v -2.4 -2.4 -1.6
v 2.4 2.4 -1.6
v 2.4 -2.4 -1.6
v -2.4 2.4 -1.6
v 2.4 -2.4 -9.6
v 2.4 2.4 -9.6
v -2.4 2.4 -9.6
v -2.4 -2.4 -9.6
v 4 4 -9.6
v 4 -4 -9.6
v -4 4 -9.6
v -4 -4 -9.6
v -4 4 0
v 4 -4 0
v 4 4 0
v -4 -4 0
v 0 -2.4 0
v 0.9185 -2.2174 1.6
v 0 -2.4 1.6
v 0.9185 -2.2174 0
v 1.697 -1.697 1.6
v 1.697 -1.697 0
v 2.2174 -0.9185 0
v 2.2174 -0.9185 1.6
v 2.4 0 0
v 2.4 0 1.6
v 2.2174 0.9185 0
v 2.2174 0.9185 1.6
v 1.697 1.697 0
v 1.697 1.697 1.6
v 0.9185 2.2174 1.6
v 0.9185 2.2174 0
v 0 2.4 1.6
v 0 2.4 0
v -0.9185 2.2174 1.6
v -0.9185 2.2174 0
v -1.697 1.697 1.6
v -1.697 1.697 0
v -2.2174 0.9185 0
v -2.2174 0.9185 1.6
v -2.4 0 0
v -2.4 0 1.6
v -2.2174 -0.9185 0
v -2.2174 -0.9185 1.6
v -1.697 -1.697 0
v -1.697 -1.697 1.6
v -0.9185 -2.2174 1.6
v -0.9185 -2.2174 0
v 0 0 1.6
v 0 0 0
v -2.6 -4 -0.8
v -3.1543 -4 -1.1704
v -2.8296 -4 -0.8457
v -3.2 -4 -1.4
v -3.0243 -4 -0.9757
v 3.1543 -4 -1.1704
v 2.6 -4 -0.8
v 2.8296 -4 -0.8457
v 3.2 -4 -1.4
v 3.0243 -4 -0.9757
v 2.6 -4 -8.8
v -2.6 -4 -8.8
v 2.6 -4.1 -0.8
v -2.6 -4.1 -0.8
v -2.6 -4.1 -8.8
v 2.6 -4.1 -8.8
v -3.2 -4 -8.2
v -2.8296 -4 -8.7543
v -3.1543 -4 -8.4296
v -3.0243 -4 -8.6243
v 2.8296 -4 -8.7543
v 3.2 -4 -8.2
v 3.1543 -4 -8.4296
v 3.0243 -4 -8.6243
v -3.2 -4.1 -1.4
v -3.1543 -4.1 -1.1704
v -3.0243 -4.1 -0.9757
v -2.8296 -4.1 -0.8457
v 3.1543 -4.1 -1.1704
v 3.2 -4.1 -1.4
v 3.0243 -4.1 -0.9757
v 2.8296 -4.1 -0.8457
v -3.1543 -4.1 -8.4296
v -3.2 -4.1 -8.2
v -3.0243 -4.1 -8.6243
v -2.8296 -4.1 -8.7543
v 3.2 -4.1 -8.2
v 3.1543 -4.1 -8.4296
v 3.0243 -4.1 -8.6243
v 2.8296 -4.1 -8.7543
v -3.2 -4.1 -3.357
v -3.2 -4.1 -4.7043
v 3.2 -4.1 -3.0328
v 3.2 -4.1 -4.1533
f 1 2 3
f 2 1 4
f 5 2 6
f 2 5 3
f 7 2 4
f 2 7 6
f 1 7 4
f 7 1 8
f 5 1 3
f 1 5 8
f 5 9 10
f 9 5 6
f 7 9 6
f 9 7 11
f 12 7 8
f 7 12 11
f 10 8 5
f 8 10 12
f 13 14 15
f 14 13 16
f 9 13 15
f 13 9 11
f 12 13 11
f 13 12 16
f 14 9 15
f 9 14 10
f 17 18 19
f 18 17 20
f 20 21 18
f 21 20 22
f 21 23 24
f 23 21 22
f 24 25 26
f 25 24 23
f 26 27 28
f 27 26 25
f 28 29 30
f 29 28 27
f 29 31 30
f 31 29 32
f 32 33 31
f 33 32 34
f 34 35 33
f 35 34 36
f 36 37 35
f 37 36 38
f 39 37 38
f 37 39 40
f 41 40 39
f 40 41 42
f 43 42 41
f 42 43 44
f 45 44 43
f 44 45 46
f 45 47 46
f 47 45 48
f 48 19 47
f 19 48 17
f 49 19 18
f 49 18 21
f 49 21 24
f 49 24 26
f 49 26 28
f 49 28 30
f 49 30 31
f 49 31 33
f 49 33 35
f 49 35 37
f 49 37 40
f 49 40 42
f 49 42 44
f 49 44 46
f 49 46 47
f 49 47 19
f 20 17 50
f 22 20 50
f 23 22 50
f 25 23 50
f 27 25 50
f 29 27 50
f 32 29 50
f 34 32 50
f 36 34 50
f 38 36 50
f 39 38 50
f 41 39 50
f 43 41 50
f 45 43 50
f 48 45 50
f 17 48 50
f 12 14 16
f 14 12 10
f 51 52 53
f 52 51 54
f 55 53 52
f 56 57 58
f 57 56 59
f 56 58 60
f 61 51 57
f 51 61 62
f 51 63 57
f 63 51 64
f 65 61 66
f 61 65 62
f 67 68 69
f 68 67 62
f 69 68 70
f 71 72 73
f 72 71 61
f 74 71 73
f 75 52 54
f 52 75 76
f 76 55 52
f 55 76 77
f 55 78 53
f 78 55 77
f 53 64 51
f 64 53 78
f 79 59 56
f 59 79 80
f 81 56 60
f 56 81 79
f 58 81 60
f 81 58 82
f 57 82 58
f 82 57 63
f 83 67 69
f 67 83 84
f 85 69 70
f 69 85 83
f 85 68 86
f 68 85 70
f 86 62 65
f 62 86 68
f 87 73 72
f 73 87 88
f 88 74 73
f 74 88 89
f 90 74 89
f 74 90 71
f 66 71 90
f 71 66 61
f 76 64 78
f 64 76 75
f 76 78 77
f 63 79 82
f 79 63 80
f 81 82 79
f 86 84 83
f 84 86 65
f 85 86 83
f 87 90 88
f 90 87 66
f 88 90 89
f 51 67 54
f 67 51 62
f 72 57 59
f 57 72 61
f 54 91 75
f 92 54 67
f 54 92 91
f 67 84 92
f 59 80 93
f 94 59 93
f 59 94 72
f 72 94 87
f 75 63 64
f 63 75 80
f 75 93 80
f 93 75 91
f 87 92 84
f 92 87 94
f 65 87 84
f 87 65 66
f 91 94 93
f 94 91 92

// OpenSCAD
// file: ../p/4-4edge.scad
use <../lib.scad>
function ldraw_lib__4_4edge() = [
// 0 Circle 1.0
// 0 Name: 4-4edge.dat
// 0 Author: James Jessiman
// 0 !LDRAW_ORG Primitive UPDATE 2017-01
// 0 !LICENSE Licensed under CC BY 2.0 and CC BY 4.0 : see CAreadme.txt
// 
// 0 BFC CERTIFY CCW
  [0,"BFC","CERTIFY"],
  [0,"BFC","CCW"],
// 
// 0 !HISTORY 1998-12-15 [PTadmin] Official Update 1998-10
// 0 !HISTORY 2005-12-28 [PTadmin] Official Update 2005-01
// 0 !HISTORY 2007-06-24 [PTadmin] Header formatted for Contributor Agreement
// 0 !HISTORY 2008-07-01 [PTadmin] Official Update 2008-01
// 0 !HISTORY 2017-01-15 [Steffen] BFCed
// 0 !HISTORY 2017-12-30 [PTadmin] Official Update 2017-01
// 
// 
// 2 24 1 0 0 0.9239 0 0.3827
  [2,24,1,0,0,0.9239,0,0.3827],
// 2 24 0.9239 0 0.3827 0.7071 0 0.7071
  [2,24,0.9239,0,0.3827,0.7071,0,0.7071],
// 2 24 0.7071 0 0.7071 0.3827 0 0.9239
  [2,24,0.7071,0,0.7071,0.3827,0,0.9239],
// 2 24 0.3827 0 0.9239 0 0 1
  [2,24,0.3827,0,0.9239,0,0,1],
// 2 24 0 0 1 -0.3827 0 0.9239
  [2,24,0,0,1,-0.3827,0,0.9239],
// 2 24 -0.3827 0 0.9239 -0.7071 0 0.7071
  [2,24,-0.3827,0,0.9239,-0.7071,0,0.7071],
// 2 24 -0.7071 0 0.7071 -0.9239 0 0.3827
  [2,24,-0.7071,0,0.7071,-0.9239,0,0.3827],
// 2 24 -0.9239 0 0.3827 -1 0 -0
  [2,24,-0.9239,0,0.3827,-1,0,-0],
// 2 24 -1 0 -0 -0.9239 0 -0.3827
  [2,24,-1,0,-0,-0.9239,0,-0.3827],
// 2 24 -0.9239 0 -0.3827 -0.7071 0 -0.7071
  [2,24,-0.9239,0,-0.3827,-0.7071,0,-0.7071],
// 2 24 -0.7071 0 -0.7071 -0.3827 0 -0.9239
  [2,24,-0.7071,0,-0.7071,-0.3827,0,-0.9239],
// 2 24 -0.3827 0 -0.9239 0 0 -1
  [2,24,-0.3827,0,-0.9239,0,0,-1],
// 2 24 0 0 -1 0.3827 0 -0.9239
  [2,24,0,0,-1,0.3827,0,-0.9239],
// 2 24 0.3827 0 -0.9239 0.7071 0 -0.7071
  [2,24,0.3827,0,-0.9239,0.7071,0,-0.7071],
// 2 24 0.7071 0 -0.7071 0.9239 0 -0.3827
  [2,24,0.7071,0,-0.7071,0.9239,0,-0.3827],
// 2 24 0.9239 0 -0.3827 1 0 0
  [2,24,0.9239,0,-0.3827,1,0,0],
];
module ldraw_lib__4_4edge(step=0, col=false, unit=2/5, alt=false, line=0.2, solid=!$preview)
    makepoly(ldraw_lib__4_4edge(), step=step, col=col, unit=unit, alt=alt, line=line, solid=solid);
ldraw_lib__4_4edge(line=0.2);
// file: ../p/4-4disc.scad
use <../lib.scad>
function ldraw_lib__4_4disc() = [
// 0 Disc 1.0
// 0 Name: 4-4disc.dat
// 0 Author: James Jessiman
// 0 !LDRAW_ORG Primitive UPDATE 2002-02
// 0 !LICENSE Licensed under CC BY 2.0 and CC BY 4.0 : see CAreadme.txt
// 
// 0 BFC CERTIFY CCW
  [0,"BFC","CERTIFY"],
  [0,"BFC","CCW"],
// 
// 0 !HISTORY 1998-12-15 [PTadmin] Official Update 1998-10
// 0 !HISTORY 2002-03-23 [sbliss] Added BFC statement
// 0 !HISTORY 2002-04-25 [PTadmin] Official Update 2002-02
// 0 !HISTORY 2007-06-24 [PTadmin] Header formatted for Contributor Agreement
// 0 !HISTORY 2008-07-01 [PTadmin] Official Update 2008-01
// 
// 
// 3 16 0 0 0 1 0 0 0.9239 0 0.3827
  [3,16,0,0,0,1,0,0,0.9239,0,0.3827],
// 3 16 0 0 0 0.9239 0 0.3827 0.7071 0 0.7071
  [3,16,0,0,0,0.9239,0,0.3827,0.7071,0,0.7071],
// 3 16 0 0 0 0.7071 0 0.7071 0.3827 0 0.9239
  [3,16,0,0,0,0.7071,0,0.7071,0.3827,0,0.9239],
// 3 16 0 0 0 0.3827 0 0.9239 0 0 1
  [3,16,0,0,0,0.3827,0,0.9239,0,0,1],
// 3 16 0 0 0 0 0 1 -0.3827 0 0.9239
  [3,16,0,0,0,0,0,1,-0.3827,0,0.9239],
// 3 16 0 0 0 -0.3827 0 0.9239 -0.7071 0 0.7071
  [3,16,0,0,0,-0.3827,0,0.9239,-0.7071,0,0.7071],
// 3 16 0 0 0 -0.7071 0 0.7071 -0.9239 0 0.3827
  [3,16,0,0,0,-0.7071,0,0.7071,-0.9239,0,0.3827],
// 3 16 0 0 0 -0.9239 0 0.3827 -1 0 -0
  [3,16,0,0,0,-0.9239,0,0.3827,-1,0,-0],
// 3 16 0 0 0 -1 0 -0 -0.9239 0 -0.3827
  [3,16,0,0,0,-1,0,-0,-0.9239,0,-0.3827],
// 3 16 0 0 0 -0.9239 0 -0.3827 -0.7071 0 -0.7071
  [3,16,0,0,0,-0.9239,0,-0.3827,-0.7071,0,-0.7071],
// 3 16 0 0 0 -0.7071 0 -0.7071 -0.3827 0 -0.9239
  [3,16,0,0,0,-0.7071,0,-0.7071,-0.3827,0,-0.9239],
// 3 16 0 0 0 -0.3827 0 -0.9239 0 0 -1
  [3,16,0,0,0,-0.3827,0,-0.9239,0,0,-1],
// 3 16 0 0 0 0 0 -1 0.3827 0 -0.9239
  [3,16,0,0,0,0,0,-1,0.3827,0,-0.9239],
// 3 16 0 0 0 0.3827 0 -0.9239 0.7071 0 -0.7071
  [3,16,0,0,0,0.3827,0,-0.9239,0.7071,0,-0.7071],
// 3 16 0 0 0 0.7071 0 -0.7071 0.9239 0 -0.3827
  [3,16,0,0,0,0.7071,0,-0.7071,0.9239,0,-0.3827],
// 3 16 0 0 0 0.9239 0 -0.3827 1 0 0
  [3,16,0,0,0,0.9239,0,-0.3827,1,0,0],
// 0
];
module ldraw_lib__4_4disc(step=0, col=false, unit=2/5, alt=false, line=0.2, solid=!$preview)
    makepoly(ldraw_lib__4_4disc(), step=step, col=col, unit=unit, alt=alt, line=line, solid=solid);
ldraw_lib__4_4disc(line=0.2);
// file: ../p/4-4cyli.scad
use <../lib.scad>
$fa=1; $fs=0.2;
function ldraw_lib__4_4cyli(realsolid=false) = [
// 0 Cylinder 1.0
// 0 Name: 4-4cyli.dat
// 0 Author: James Jessiman
// 0 !LDRAW_ORG Primitive UPDATE 2005-01
// 0 !LICENSE Licensed under CC BY 2.0 and CC BY 4.0 : see CAreadme.txt
// 
// 0 BFC CERTIFY CCW
  [0,"BFC","CERTIFY"],
  [0,"BFC","CCW"],
// 
// 0 !HISTORY 1998-12-15 [PTadmin] Official Update 1998-10
// 0 !HISTORY 2002-03-23 [sbliss] Added BFC statement; merged headers from files in distributions LDraw 0.27 and Complete.
// 0 !HISTORY 2002-04-25 [PTadmin] Official Update 2002-02
// 0 !HISTORY 2004-12-14 [guyvivan] BFC CCW
// 0 !HISTORY 2005-12-28 [PTadmin] Official Update 2005-01
// 0 !HISTORY 2007-06-24 [PTadmin] Header formatted for Contributor Agreement
// 0 !HISTORY 2008-07-01 [PTadmin] Official Update 2008-01
// 
// 
// 4 16 1 1 0 0.9239 1 0.3827 0.9239 0 0.3827 1 0 0
  [4,16,1,1,0,0.9239,1,0.3827,0.9239,0,0.3827,1,0,0],
// 5 24 1 0 0 1 1 0 0.9239 0 0.3827 0.9239 0 -0.3827
  [5,24,1,0,0,1,1,0,0.9239,0,0.3827,0.9239,0,-0.3827],
// 4 16 0.9239 1 0.3827 0.7071 1 0.7071 0.7071 0 0.7071 0.9239 0 0.3827
  [4,16,0.9239,1,0.3827,0.7071,1,0.7071,0.7071,0,0.7071,0.9239,0,0.3827],
// 5 24 0.9239 0 0.3827 0.9239 1 0.3827 0.7071 0 0.7071 1 0 0
  [5,24,0.9239,0,0.3827,0.9239,1,0.3827,0.7071,0,0.7071,1,0,0],
// 4 16 0.7071 1 0.7071 0.3827 1 0.9239 0.3827 0 0.9239 0.7071 0 0.7071
  [4,16,0.7071,1,0.7071,0.3827,1,0.9239,0.3827,0,0.9239,0.7071,0,0.7071],
// 5 24 0.7071 0 0.7071 0.7071 1 0.7071 0.3827 0 0.9239 0.9239 0 0.3827
  [5,24,0.7071,0,0.7071,0.7071,1,0.7071,0.3827,0,0.9239,0.9239,0,0.3827],
// 4 16 0.3827 1 0.9239 0 1 1 0 0 1 0.3827 0 0.9239
  [4,16,0.3827,1,0.9239,0,1,1,0,0,1,0.3827,0,0.9239],
// 5 24 0.3827 0 0.9239 0.3827 1 0.9239 0 0 1 0.7071 0 0.7071
  [5,24,0.3827,0,0.9239,0.3827,1,0.9239,0,0,1,0.7071,0,0.7071],
// 4 16 0 1 1 -0.3827 1 0.9239 -0.3827 0 0.9239 0 0 1
  [4,16,0,1,1,-0.3827,1,0.9239,-0.3827,0,0.9239,0,0,1],
// 5 24 0 0 1 0 1 1 -0.3827 0 0.9239 0.3827 0 0.9239
  [5,24,0,0,1,0,1,1,-0.3827,0,0.9239,0.3827,0,0.9239],
// 4 16 -0.3827 1 0.9239 -0.7071 1 0.7071 -0.7071 0 0.7071 -0.3827 0 0.9239
  [4,16,-0.3827,1,0.9239,-0.7071,1,0.7071,-0.7071,0,0.7071,-0.3827,0,0.9239],
// 5 24 -0.3827 0 0.9239 -0.3827 1 0.9239 -0.7071 0 0.7071 0 0 1
  [5,24,-0.3827,0,0.9239,-0.3827,1,0.9239,-0.7071,0,0.7071,0,0,1],
// 4 16 -0.7071 1 0.7071 -0.9239 1 0.3827 -0.9239 0 0.3827 -0.7071 0 0.7071
  [4,16,-0.7071,1,0.7071,-0.9239,1,0.3827,-0.9239,0,0.3827,-0.7071,0,0.7071],
// 5 24 -0.7071 0 0.7071 -0.7071 1 0.7071 -0.9239 0 0.3827 -0.3827 0 0.9239
  [5,24,-0.7071,0,0.7071,-0.7071,1,0.7071,-0.9239,0,0.3827,-0.3827,0,0.9239],
// 4 16 -0.9239 1 0.3827 -1 1 0 -1 0 0 -0.9239 0 0.3827
  [4,16,-0.9239,1,0.3827,-1,1,0,-1,0,0,-0.9239,0,0.3827],
// 5 24 -0.9239 0 0.3827 -0.9239 1 0.3827 -1 0 0 -0.7071 0 0.7071
  [5,24,-0.9239,0,0.3827,-0.9239,1,0.3827,-1,0,0,-0.7071,0,0.7071],
// 4 16 -1 1 0 -0.9239 1 -0.3827 -0.9239 0 -0.3827 -1 0 0
  [4,16,-1,1,0,-0.9239,1,-0.3827,-0.9239,0,-0.3827,-1,0,0],
// 5 24 -1 0 0 -1 1 0 -0.9239 0 -0.3827 -0.9239 0 0.3827
  [5,24,-1,0,0,-1,1,0,-0.9239,0,-0.3827,-0.9239,0,0.3827],
// 4 16 -0.9239 1 -0.3827 -0.7071 1 -0.7071 -0.7071 0 -0.7071 -0.9239 0 -0.3827
  [4,16,-0.9239,1,-0.3827,-0.7071,1,-0.7071,-0.7071,0,-0.7071,-0.9239,0,-0.3827],
// 5 24 -0.9239 0 -0.3827 -0.9239 1 -0.3827 -0.7071 0 -0.7071 -1 0 0
  [5,24,-0.9239,0,-0.3827,-0.9239,1,-0.3827,-0.7071,0,-0.7071,-1,0,0],
// 4 16 -0.7071 1 -0.7071 -0.3827 1 -0.9239 -0.3827 0 -0.9239 -0.7071 0 -0.7071
  [4,16,-0.7071,1,-0.7071,-0.3827,1,-0.9239,-0.3827,0,-0.9239,-0.7071,0,-0.7071],
// 5 24 -0.7071 0 -0.7071 -0.7071 1 -0.7071 -0.3827 0 -0.9239 -0.9239 0 -0.3827
  [5,24,-0.7071,0,-0.7071,-0.7071,1,-0.7071,-0.3827,0,-0.9239,-0.9239,0,-0.3827],
// 4 16 -0.3827 1 -0.9239 0 1 -1 0 0 -1 -0.3827 0 -0.9239
  [4,16,-0.3827,1,-0.9239,0,1,-1,0,0,-1,-0.3827,0,-0.9239],
// 5 24 -0.3827 0 -0.9239 -0.3827 1 -0.9239 0 0 -1 -0.7071 0 -0.7071
  [5,24,-0.3827,0,-0.9239,-0.3827,1,-0.9239,0,0,-1,-0.7071,0,-0.7071],
// 4 16 0 1 -1 0.3827 1 -0.9239 0.3827 0 -0.9239 0 0 -1
  [4,16,0,1,-1,0.3827,1,-0.9239,0.3827,0,-0.9239,0,0,-1],
// 5 24 0 0 -1 0 1 -1 0.3827 0 -0.9239 -0.3827 0 -0.9239
  [5,24,0,0,-1,0,1,-1,0.3827,0,-0.9239,-0.3827,0,-0.9239],
// 4 16 0.3827 1 -0.9239 0.7071 1 -0.7071 0.7071 0 -0.7071 0.3827 0 -0.9239
  [4,16,0.3827,1,-0.9239,0.7071,1,-0.7071,0.7071,0,-0.7071,0.3827,0,-0.9239],
// 5 24 0.3827 0 -0.9239 0.3827 1 -0.9239 0.7071 0 -0.7071 0 0 -1
  [5,24,0.3827,0,-0.9239,0.3827,1,-0.9239,0.7071,0,-0.7071,0,0,-1],
// 4 16 0.7071 1 -0.7071 0.9239 1 -0.3827 0.9239 0 -0.3827 0.7071 0 -0.7071
  [4,16,0.7071,1,-0.7071,0.9239,1,-0.3827,0.9239,0,-0.3827,0.7071,0,-0.7071],
// 5 24 0.7071 0 -0.7071 0.7071 1 -0.7071 0.9239 0 -0.3827 0.3827 0 -0.9239
  [5,24,0.7071,0,-0.7071,0.7071,1,-0.7071,0.9239,0,-0.3827,0.3827,0,-0.9239],
// 4 16 0.9239 1 -0.3827 1 1 0 1 0 0 0.9239 0 -0.3827
  [4,16,0.9239,1,-0.3827,1,1,0,1,0,0,0.9239,0,-0.3827],
// 5 24 0.9239 0 -0.3827 0.9239 1 -0.3827 1 0 0 0.7071 0 -0.7071
  [5,24,0.9239,0,-0.3827,0.9239,1,-0.3827,1,0,0,0.7071,0,-0.7071],
// 0
];
module ldraw_lib__4_4cyli(step=0, col=false, unit=2/5, alt=false, line=0.2, solid=!$preview)
    makepoly(ldraw_lib__4_4cyli(solid), step=step, col=col, unit=unit, alt=alt, line=line, solid=solid);
ldraw_lib__4_4cyli(line=0.2);
// file: ../p/stud.scad
use <../lib.scad>
use <4-4cyli.scad>
use <4-4disc.scad>
use <4-4edge.scad>
function ldraw_lib__stud() = [
// 0 Stud
// 0 Name: stud.dat
// 0 Author: James Jessiman
// 0 !LDRAW_ORG Primitive UPDATE 2012-01
// 0 !LICENSE Licensed under CC BY 4.0 : see CAreadme.txt
// 
// 0 BFC CERTIFY CCW
  [0,"BFC","CERTIFY"],
  [0,"BFC","CCW"],
// 
// 0 !HISTORY 2002-04-04 [sbliss] Modified for BFC compliance
// 0 !HISTORY 2002-04-25 [PTadmin] Official Update 2002-02
// 0 !HISTORY 2007-06-24 [PTadmin] Header formatted for Contributor Agreement
// 0 !HISTORY 2008-07-01 [PTadmin] Official Update 2008-01
// 0 !HISTORY 2012-02-16 [Philo] Changed to CCW
// 0 !HISTORY 2012-03-30 [PTadmin] Official Update 2012-01
// 
// 
// 1 16 0 0 0 6 0 0 0 1 0 0 0 6 4-4edge.dat
  [1,16,0,0,0,6,0,0,0,1,0,0,0,6, ldraw_lib__4_4edge()],
// 1 16 0 -4 0 6 0 0 0 1 0 0 0 6 4-4edge.dat
  [1,16,0,-4,0,6,0,0,0,1,0,0,0,6, ldraw_lib__4_4edge()],
// 1 16 0 0 0 6 0 0 0 -4 0 0 0 6 4-4cyli.dat
  [1,16,0,0,0,6,0,0,0,-4,0,0,0,6, ldraw_lib__4_4cyli()],
// 1 16 0 -4 0 6 0 0 0 1 0 0 0 6 4-4disc.dat
  [1,16,0,-4,0,6,0,0,0,1,0,0,0,6, ldraw_lib__4_4disc()],
  [-1,16,0,0,0,6,0,0,0,-1,0,0,0,6, ldraw_lib__4_4disc()],
];
module ldraw_lib__stud(step=0, col=false, unit=2/5, alt=false, line=0.2, solid=!$preview)
    makepoly(ldraw_lib__stud(), step=step, col=col, unit=unit, alt=alt, line=line, solid=solid);
ldraw_lib__stud(line=0.2);
// file: ../p/box5.scad
use <../lib.scad>
function ldraw_lib__box5() = [
// 0 Box with 5 Faces and All Edges
// 0 Name: box5.dat
// 0 Author: James Jessiman
// 0 !LDRAW_ORG Primitive UPDATE 2012-01
// 0 !LICENSE Licensed under CC BY 2.0 and CC BY 4.0 : see CAreadme.txt
// 
// 0 BFC CERTIFY CCW
  [0,"BFC","CERTIFY"],
  [0,"BFC","CCW"],
// 
// 0 !HISTORY 2002-04-03 [sbliss] Modified for BFC compliance
// 0 !HISTORY 2002-04-25 [PTadmin] Official Update 2002-02
// 0 !HISTORY 2007-06-24 [PTadmin] Header formatted for Contributor Agreement
// 0 !HISTORY 2008-07-01 [PTadmin] Official Update 2008-01
// 0 !HISTORY 2012-02-16 [Philo] Changed to CCW
// 0 !HISTORY 2012-03-30 [PTadmin] Official Update 2012-01
// 
// 
// 2 24 1 1 1 -1 1 1
  [2,24,1,1,1,-1,1,1],
// 2 24 -1 1 1 -1 1 -1
  [2,24,-1,1,1,-1,1,-1],
// 2 24 -1 1 -1 1 1 -1
  [2,24,-1,1,-1,1,1,-1],
// 2 24 1 1 -1 1 1 1
  [2,24,1,1,-1,1,1,1],
// 2 24 1 0 1 -1 0 1
  [2,24,1,0,1,-1,0,1],
// 2 24 -1 0 1 -1 0 -1
  [2,24,-1,0,1,-1,0,-1],
// 2 24 -1 0 -1 1 0 -1
  [2,24,-1,0,-1,1,0,-1],
// 2 24 1 0 -1 1 0 1
  [2,24,1,0,-1,1,0,1],
// 2 24 1 0 1 1 1 1
  [2,24,1,0,1,1,1,1],
// 2 24 -1 0 1 -1 1 1
  [2,24,-1,0,1,-1,1,1],
// 2 24 1 0 -1 1 1 -1
  [2,24,1,0,-1,1,1,-1],
// 2 24 -1 0 -1 -1 1 -1
  [2,24,-1,0,-1,-1,1,-1],
// 4 16 -1 1 1 1 1 1 1 1 -1 -1 1 -1
  [4,16,-1,1,1,1,1,1,1,1,-1,-1,1,-1],
// 4 16 -1 1 1 -1 0 1 1 0 1 1 1 1
  [4,16,-1,1,1,-1,0,1,1,0,1,1,1,1],
// 4 16 -1 1 -1 -1 0 -1 -1 0 1 -1 1 1
  [4,16,-1,1,-1,-1,0,-1,-1,0,1,-1,1,1],
// 4 16 1 1 -1 1 0 -1 -1 0 -1 -1 1 -1
  [4,16,1,1,-1,1,0,-1,-1,0,-1,-1,1,-1],
// 4 16 1 1 1 1 0 1 1 0 -1 1 1 -1
  [4,16,1,1,1,1,0,1,1,0,-1,1,1,-1],
];
makepoly(ldraw_lib__box5(), line=0.2);
// file: ../p/box4t.scad
use <../lib.scad>
function ldraw_lib__box4t() = [
// 0 Box with 4 Adjacent Faces and All Edges
// 0 Name: box4t.dat
// 0 Author: Tore Eriksson [Tore_Eriksson]
// 0 !LDRAW_ORG Primitive UPDATE 2003-02
// 0 !LICENSE Licensed under CC BY 2.0 and CC BY 4.0 : see CAreadme.txt
// 
// 0 BFC CERTIFY CCW
  [0,"BFC","CERTIFY"],
  [0,"BFC","CCW"],
// 
// 0 !HISTORY 1997-09-29 [PTadmin] Official Update 1997-15
// 0 !HISTORY 2002-08-31 [izanette] Modified with WINDZ for BFC compliance
// 0 !HISTORY 2003-08-01 [PTadmin] Official Update 2003-02
// 0 !HISTORY 2007-06-24 [PTadmin] Header formatted for Contributor Agreement
// 0 !HISTORY 2008-07-01 [PTadmin] Official Update 2008-01
// 
// 
// 2 24 1 1 1 -1 1 1
  [2,24,1,1,1,-1,1,1],
// 2 24 -1 1 1 -1 1 -1
  [2,24,-1,1,1,-1,1,-1],
// 2 24 -1 1 -1 1 1 -1
  [2,24,-1,1,-1,1,1,-1],
// 2 24 1 1 -1 1 1 1
  [2,24,1,1,-1,1,1,1],
// 2 24 1 0 1 -1 0 1
  [2,24,1,0,1,-1,0,1],
// 2 24 -1 0 1 -1 0 -1
  [2,24,-1,0,1,-1,0,-1],
// 2 24 -1 0 -1 1 0 -1
  [2,24,-1,0,-1,1,0,-1],
// 2 24 1 0 -1 1 0 1
  [2,24,1,0,-1,1,0,1],
// 2 24 1 0 1 1 1 1
  [2,24,1,0,1,1,1,1],
// 2 24 -1 0 1 -1 1 1
  [2,24,-1,0,1,-1,1,1],
// 2 24 1 0 -1 1 1 -1
  [2,24,1,0,-1,1,1,-1],
// 2 24 -1 0 -1 -1 1 -1
  [2,24,-1,0,-1,-1,1,-1],
// 4 16 1 1 1 1 1 -1 -1 1 -1 -1 1 1
  [4,16,1,1,1,1,1,-1,-1,1,-1,-1,1,1],
// 4 16 1 1 1 -1 1 1 -1 0 1 1 0 1
  [4,16,1,1,1,-1,1,1,-1,0,1,1,0,1],
// 4 16 -1 1 1 -1 1 -1 -1 0 -1 -1 0 1
  [4,16,-1,1,1,-1,1,-1,-1,0,-1,-1,0,1],
// 0 4 16 -1 1 -1 -1 0 -1 1 0 -1 1 1 -1
// 4 16 1 1 -1 1 1 1 1 0 1 1 0 -1
  [4,16,1,1,-1,1,1,1,1,0,1,1,0,-1],
// 0
];
makepoly(ldraw_lib__box4t(), line=0.2);
// file: ../p/box3u12.scad
use <../lib.scad>
function ldraw_lib__box3u12() = [
// 0 Box with 3 Parallel Faces without Any Edges
// 0 Name: box3u12.dat
// 0 Author: J.C. Tchang [tchang]
// 0 !LDRAW_ORG Primitive UPDATE 2014-02
// 0 !LICENSE Licensed under CC BY 2.0 and CC BY 4.0 : see CAreadme.txt
// 
// 0 BFC CERTIFY CCW
  [0,"BFC","CERTIFY"],
  [0,"BFC","CCW"],
// 
// 0 !HISTORY 2014-12-23 [PTadmin] Official Update 2014-02
// 
// 
// 4 16 -1 1 1 1 1 1 1 1 -1 -1 1 -1
  [4,16,-1,1,1,1,1,1,1,1,-1,-1,1,-1],
// 4 16 -1 1 1 -1 0 1 1 0 1 1 1 1
  [4,16,-1,1,1,-1,0,1,1,0,1,1,1,1],
// 4 16 1 1 -1 1 0 -1 -1 0 -1 -1 1 -1
  [4,16,1,1,-1,1,0,-1,-1,0,-1,-1,1,-1],
];
makepoly(ldraw_lib__box3u12(), line=0.2);
// file: ../p/1-4cyli.scad
use <../lib.scad>
function ldraw_lib__1_4cyli() = [
// 0 Cylinder 0.25
// 0 Name: 1-4cyli.dat
// 0 Author: James Jessiman
// 0 !LDRAW_ORG Primitive UPDATE 2012-01
// 0 !LICENSE Licensed under CC BY 2.0 and CC BY 4.0 : see CAreadme.txt
// 
// 0 BFC CERTIFY CCW
  [0,"BFC","CERTIFY"],
  [0,"BFC","CCW"],
// 
// 0 !HISTORY 2002-03-23 [sbliss] Added BFC statement.
// 0 !HISTORY 2002-04-25 [PTadmin] Official Update 2002-02
// 0 !HISTORY 2007-06-22 [PTadmin] Header formatted for Contributor Agreement
// 0 !HISTORY 2008-07-01 [PTadmin] Official Update 2008-01
// 0 !HISTORY 2012-02-16 [Philo] Changed to CCW
// 0 !HISTORY 2012-03-30 [PTadmin] Official Update 2012-01
// 
// 
// 4 16 1 1 0 0.9239 1 0.3827 0.9239 0 0.3827 1 0 0
  [4,16,1,1,0,0.9239,1,0.3827,0.9239,0,0.3827,1,0,0],
// 5 24 1 0 0 1 1 0 0.9239 0 0.3827 1 0 -1
  [5,24,1,0,0,1,1,0,0.9239,0,0.3827,1,0,-1],
// 4 16 0.9239 1 0.3827 0.7071 1 0.7071 0.7071 0 0.7071 0.9239 0 0.3827
  [4,16,0.9239,1,0.3827,0.7071,1,0.7071,0.7071,0,0.7071,0.9239,0,0.3827],
// 5 24 0.9239 0 0.3827 0.9239 1 0.3827 0.7071 0 0.7071 1 0 0
  [5,24,0.9239,0,0.3827,0.9239,1,0.3827,0.7071,0,0.7071,1,0,0],
// 4 16 0.7071 1 0.7071 0.3827 1 0.9239 0.3827 0 0.9239 0.7071 0 0.7071
  [4,16,0.7071,1,0.7071,0.3827,1,0.9239,0.3827,0,0.9239,0.7071,0,0.7071],
// 5 24 0.7071 0 0.7071 0.7071 1 0.7071 0.3827 0 0.9239 0.9239 0 0.3827
  [5,24,0.7071,0,0.7071,0.7071,1,0.7071,0.3827,0,0.9239,0.9239,0,0.3827],
// 4 16 0.3827 1 0.9239 0 1 1 0 0 1 0.3827 0 0.9239
  [4,16,0.3827,1,0.9239,0,1,1,0,0,1,0.3827,0,0.9239],
// 5 24 0.3827 0 0.9239 0.3827 1 0.9239 0 0 1 0.7071 0 0.7071
  [5,24,0.3827,0,0.9239,0.3827,1,0.9239,0,0,1,0.7071,0,0.7071],
// 5 24 0 0 1 0 1 1 0.3827 0 0.9239 -1 0 1
  [5,24,0,0,1,0,1,1,0.3827,0,0.9239,-1,0,1],
];
module ldraw_lib__1_4cyli(step=0, col=false, unit=2/5, alt=false, line=0.2, solid=!$preview)
    makepoly(ldraw_lib__1_4cyli(), step=step, col=col, unit=unit, alt=alt, line=line, solid=solid);
ldraw_lib__1_4cyli(line=0.2);
// file: ../p/1-4chrd.scad
use <../lib.scad>
$fa=1; $fs=0.2;
function ldraw_lib__1_4chrd(realsolid=false) = [
// 0 Chord 0.25
// 0 Name: 1-4chrd.dat
// 0 Author: Tony Hafner [hafhead]
// 0 !LDRAW_ORG Primitive UPDATE 2012-02
// 0 !LICENSE Licensed under CC BY 2.0 and CC BY 4.0 : see CAreadme.txt
// 
// 0 BFC CERTIFY CCW
  [0,"BFC","CERTIFY"],
  [0,"BFC","CCW"],
// 
// 0 !HISTORY 2004-04-22 [PTadmin] Official Update 2004-02
// 0 !HISTORY 2007-10-09 [PTadmin] Header formatted for Contributor Agreement
// 0 !HISTORY 2008-07-01 [PTadmin] Official Update 2008-01
// 0 !HISTORY 2012-08-02 [MMR1988] Re-creation with PrimGen2 and Rectifier
// 0 !HISTORY 2012-08-09 [PTadmin] Official Update 2012-02
// 
// 
// 4 16 0.9239 0 0.3827 0.3827 0 0.9239 0 0 1 1 0 0
  [4,16,0.9239,0,0.3827,0.3827,0,0.9239,0,0,1,1,0,0],
// 3 16 0.7071 0 0.7071 0.3827 0 0.9239 0.9239 0 0.3827
  [3,16,0.7071,0,0.7071,0.3827,0,0.9239,0.9239,0,0.3827],
];
module ldraw_lib__1_4chrd(step=0, col=false, unit=2/5, alt=false, line=0.2, solid=!$preview)
    makepoly(ldraw_lib__1_4chrd(solid), step=step, col=col, unit=unit, alt=alt, line=line, solid=solid);
ldraw_lib__1_4chrd(line=0.2);
// file: s/3005s01.scad
use <../../lib.scad>
use <../../p/box4t.scad>
use <../../p/box5.scad>
use <../../p/stud.scad>
function ldraw_lib__s__3005s01() = [
// 0 ~Brick  1 x  1 without Front Face
// 0 Name: s\3005s01.dat
// 0 Author: John Riley [jriley]
// 0 !LDRAW_ORG Subpart UPDATE 2004-01
// 0 !LICENSE Licensed under CC BY 2.0 and CC BY 4.0 : see CAreadme.txt
// 
// 0 BFC CERTIFY CCW
  [0,"BFC","CERTIFY"],
  [0,"BFC","CCW"],
// 
// 0 !HISTORY 2003-09-07 [jriley] BFCed & Subfiled
// 0 !HISTORY 2004-03-02 [PTadmin] Official Update 2004-01
// 0 !HISTORY 2007-08-29 [PTadmin] Header formatted for Contributor Agreement
// 0 !HISTORY 2008-07-01 [PTadmin] Official Update 2008-01
// 
// 
// 0 BFC INVERTNEXT
  [0,"BFC","INVERTNEXT"],
// 1 16 0 24 0 0 0 6 0 -20 0 -6 0 0 box5.dat
  [1,16,0,24,0,0,0,6,0,-20,0,-6,0,0, ldraw_lib__box5()],
// 4 16 10 24 -10 6 24 -6 6 24 6 10 24 10
  [4,16,10,24,-10,6,24,-6,6,24,6,10,24,10],
// 4 16 10 24 10 6 24 6 -6 24 6 -10 24 10
  [4,16,10,24,10,6,24,6,-6,24,6,-10,24,10],
// 4 16 -10 24 10 -6 24 6 -6 24 -6 -10 24 -10
  [4,16,-10,24,10,-6,24,6,-6,24,-6,-10,24,-10],
// 4 16 -10 24 -10 -6 24 -6 6 24 -6 10 24 -10
  [4,16,-10,24,-10,-6,24,-6,6,24,-6,10,24,-10],
// 1 16 0 24 0 10 0 0 0 -24 0 0 0 10 box4t.dat
  [1,16,0,24,0,10,0,0,0,-24,0,0,0,10, ldraw_lib__box4t()],
// 1 16 0 0 0 0 0 1 0 1 0 -1 0 0 stud.dat
  [1,16,0,0,0,0,0,1,0,1,0,-1,0,0, ldraw_lib__stud()],
// 0
];
module ldraw_lib__s__3005s01(step=0, col=false, unit=2/5, alt=false, line=0.2, solid=!$preview)
    makepoly(ldraw_lib__s__3005s01(), step=step, col=col, unit=unit, alt=alt, line=line, solid=solid);
ldraw_lib__s__3005s01(line=0.2);
// file: 6148328z.scad
use <../lib.scad>
use <../p/1-4chrd.scad>
use <../p/1-4cyli.scad>
use <../p/box3u12.scad>
function ldraw_lib__6148328z() = [
// 0 Sticker  1.0 x  0.8 with White Stripe on Red Background Left
// 0 Name: 6148328z.dat
// 0 Author: Massimo Maso [Sirio]
// 0 !LDRAW_ORG Part UPDATE 2024-05
// 0 !LICENSE Licensed under CC BY 4.0 : see CAreadme.txt
// 
// 0 BFC CERTIFY CCW
  [0,"BFC","CERTIFY"],
  [0,"BFC","CCW"],
// 
// 0 !KEYWORDS 917K, Bricklink 75876stk01, Brickowl 852010, Pit Lane, Porsche
// 0 !KEYWORDS Rebrickable 26357, set 75876, Speed Champions
// 
// 0 !HISTORY 2024-06-30 [OrionP] Official Update 2024-05
// 
// 
// 0 // Primitives
// 
// 1 16 -6.5 0 8.5 -1.5 0 0 0 -1 0 0 0 1.5 1-4chrd.dat
  [1,16,-6.5,0,8.5,-1.5,0,0,0,-1,0,0,0,1.5, ldraw_lib__1_4chrd()],
// 1 16 6.5 0 8.5 1.5 0 0 0 -1 0 0 0 1.5 1-4chrd.dat
  [1,16,6.5,0,8.5,1.5,0,0,0,-1,0,0,0,1.5, ldraw_lib__1_4chrd()],
// 1 16 0 -.25 0 6.5 0 0 0 .25 0 0 0 10 box3u12.dat
  [1,16,0,-.25,0,6.5,0,0,0,.25,0,0,0,10, ldraw_lib__box3u12()],
// 1 16 -6.5 0 -8.5 -1.5 0 0 0 -1 0 0 0 -1.5 1-4chrd.dat
  [1,16,-6.5,0,-8.5,-1.5,0,0,0,-1,0,0,0,-1.5, ldraw_lib__1_4chrd()],
// 1 16 6.5 0 -8.5 1.5 0 0 0 -1 0 0 0 -1.5 1-4chrd.dat
  [1,16,6.5,0,-8.5,1.5,0,0,0,-1,0,0,0,-1.5, ldraw_lib__1_4chrd()],
// 1 16 -6.5 0 8.5 -1.5 0 0 0 -.25 0 0 0 1.5 1-4cyli.dat
  [1,16,-6.5,0,8.5,-1.5,0,0,0,-.25,0,0,0,1.5, ldraw_lib__1_4cyli()],
// 1 16 6.5 0 8.5 1.5 0 0 0 -.25 0 0 0 1.5 1-4cyli.dat
  [1,16,6.5,0,8.5,1.5,0,0,0,-.25,0,0,0,1.5, ldraw_lib__1_4cyli()],
// 1 16 -6.5 0 -8.5 -1.5 0 0 0 -.25 0 0 0 -1.5 1-4cyli.dat
  [1,16,-6.5,0,-8.5,-1.5,0,0,0,-.25,0,0,0,-1.5, ldraw_lib__1_4cyli()],
// 1 16 6.5 0 -8.5 1.5 0 0 0 -.25 0 0 0 -1.5 1-4cyli.dat
  [1,16,6.5,0,-8.5,1.5,0,0,0,-.25,0,0,0,-1.5, ldraw_lib__1_4cyli()],
// 1 4 -6.5 -.25 8.5 -1.5 0 0 0 1 0 0 0 1.5 1-4chrd.dat
  [1,4,-6.5,-.25,8.5,-1.5,0,0,0,1,0,0,0,1.5, ldraw_lib__1_4chrd()],
// 1 4 6.5 -.25 8.5 1.5 0 0 0 1 0 0 0 1.5 1-4chrd.dat
  [1,4,6.5,-.25,8.5,1.5,0,0,0,1,0,0,0,1.5, ldraw_lib__1_4chrd()],
// 1 4 -6.5 -.25 -8.5 -1.5 0 0 0 1 0 0 0 -1.5 1-4chrd.dat
  [1,4,-6.5,-.25,-8.5,-1.5,0,0,0,1,0,0,0,-1.5, ldraw_lib__1_4chrd()],
// 1 4 6.5 -.25 -8.5 1.5 0 0 0 1 0 0 0 -1.5 1-4chrd.dat
  [1,4,6.5,-.25,-8.5,1.5,0,0,0,1,0,0,0,-1.5, ldraw_lib__1_4chrd()],
// 0 // Bottom faces
// 4 16 -6.5 0 10 -6.5 0 -10 -8 0 -8.5 -8 0 8.5
  [4,16,-6.5,0,10,-6.5,0,-10,-8,0,-8.5,-8,0,8.5],
// 4 16 6.5 0 10 8 0 8.5 8 0 -8.5 6.5 0 -10
  [4,16,6.5,0,10,8,0,8.5,8,0,-8.5,6.5,0,-10],
// 0 // Lateral faces
// 3 16 -8 0 8.5 -8 -.25 3.6076 -8 -.25 8.5
  [3,16,-8,0,8.5,-8,-.25,3.6076,-8,-.25,8.5],
// 4 16 -8 0 8.5 -8 0 -8.5 -8 -.25 .2392 -8 -.25 3.6076
  [4,16,-8,0,8.5,-8,0,-8.5,-8,-.25,.2392,-8,-.25,3.6076],
// 3 16 -8 0 -8.5 -8 -.25 -8.5 -8 -.25 .2392
  [3,16,-8,0,-8.5,-8,-.25,-8.5,-8,-.25,.2392],
// 3 16 8 0 8.5 8 -.25 8.5 8 -.25 4.4179
  [3,16,8,0,8.5,8,-.25,8.5,8,-.25,4.4179],
// 4 16 8 0 8.5 8 -.25 4.4179 8 -.25 1.6167 8 0 -8.5
  [4,16,8,0,8.5,8,-.25,4.4179,8,-.25,1.6167,8,0,-8.5],
// 3 16 8 0 -8.5 8 -.25 1.6167 8 -.25 -8.5
  [3,16,8,0,-8.5,8,-.25,1.6167,8,-.25,-8.5],
// 0 // Top faces
// 0 // Red faces
// 4 4 -8 -.25 8.5 8 -.25 8.5 6.5 -.25 10 -6.5 -.25 10
  [4,4,-8,-.25,8.5,8,-.25,8.5,6.5,-.25,10,-6.5,-.25,10],
// 4 4 -8 -.25 8.5 -8 -.25 3.6076 8 -.25 4.4179 8 -.25 8.5
  [4,4,-8,-.25,8.5,-8,-.25,3.6076,8,-.25,4.4179,8,-.25,8.5],
// 4 4 -8 -.25 -8.5 8 -.25 -8.5 8 -.25 1.6167 -8 -.25 .2392
  [4,4,-8,-.25,-8.5,8,-.25,-8.5,8,-.25,1.6167,-8,-.25,.2392],
// 4 4 -8 -.25 -8.5 -6.5 -.25 -10 6.5 -.25 -10 8 -.25 -8.5
  [4,4,-8,-.25,-8.5,-6.5,-.25,-10,6.5,-.25,-10,8,-.25,-8.5],
// 0 // White face
// 4 15 -8 -.25 3.6076 -8 -.25 .2392 8 -.25 1.6167 8 -.25 4.4179
  [4,15,-8,-.25,3.6076,-8,-.25,.2392,8,-.25,1.6167,8,-.25,4.4179],
];
module ldraw_lib__6148328z(step=0, col=false, unit=2/5, alt=false, line=0.2, solid=!$preview)
    makepoly(ldraw_lib__6148328z(), step=step, col=col, unit=unit, alt=alt, line=line, solid=solid);
ldraw_lib__6148328z(line=0.2);
// file: 3005.scad
use <../lib.scad>
use <s/3005s01.scad>
function ldraw_lib__3005() = [
// 0 Brick  1 x  1
// 0 Name: 3005.dat
// 0 Author: James Jessiman
// 0 !LDRAW_ORG Part UPDATE 2022-05
// 0 !LICENSE Licensed under CC BY 2.0 and CC BY 4.0 : see CAreadme.txt
// 
// 0 BFC CERTIFY CCW
  [0,"BFC","CERTIFY"],
  [0,"BFC","CCW"],
// 
// 0 !HISTORY 2001-10-26 [PTadmin] Official Update 2001-01
// 0 !HISTORY 2002-05-07 {unknown} BFC Certification
// 0 !HISTORY 2002-06-11 [PTadmin] Official Update 2002-03
// 0 !HISTORY 2007-05-07 [PTadmin] Header formatted for Contributor Agreement
// 0 !HISTORY 2008-07-01 [PTadmin] Official Update 2008-01
// 0 !HISTORY 2022-08-04 [MagFors] Using subfile
// 0 !HISTORY 2022-09-15 [PTadmin] Official Update 2022-05
// 
// 
// 1 16 0 0 0 1 0 0 0 1 0 0 0 1 s\3005s01.dat
  [1,16,0,0,0,1,0,0,0,1,0,0,0,1, ldraw_lib__s__3005s01()],
// 4 16 -10 24 -10 10 24 -10 10 0 -10 -10 0 -10
  [4,16,-10,24,-10,10,24,-10,10,0,-10,-10,0,-10],
];
module ldraw_lib__3005(step=0, col=false, unit=2/5, alt=false, line=0.2, solid=!$preview)
    makepoly(ldraw_lib__3005(), step=step, col=col, unit=unit, alt=alt, line=line, solid=solid);
ldraw_lib__3005(line=0.2);
// main file
use <../lib.scad>
use <3005.scad>
use <6148328z.scad>
function ldraw_lib__3005d0d() = [
// 0 Brick  1 x  1 with White Stripe on Red Background Left Sticker
// 0 Name: 3005d0d.dat
// 0 Author: Vincent Messenet [Cheenzo]
// 0 !LDRAW_ORG Shortcut UPDATE 2026-05
// 0 !LICENSE Licensed under CC BY 4.0 : see CAreadme.txt
// 
// 0 BFC CERTIFY CCW
  [0,"BFC","CERTIFY"],
  [0,"BFC","CCW"],
// 
// 0 !CATEGORY Sticker Shortcut
// 
// 0 !KEYWORDS Bricklink 3005pb034R, Porsche 919 Hybrid and 917K Pit Lane
// 0 !KEYWORDS set 75876, Speed Champions
// 
// 0 !HISTORY 2026-05-31 [OrionP] Official Update 2026-05
// 
// 1 16 0 0 0 1 0 0 0 1 0 0 0 1 3005.dat
  [1,16,0,0,0,1,0,0,0,1,0,0,0,1, ldraw_lib__3005()],
// 1 16 0 12 -10 1 0 0 0 0 -1 0 1 0 6148328z.dat
  [1,16,0,12,-10,1,0,0,0,0,-1,0,1,0, ldraw_lib__6148328z()],
];
module ldraw_lib__3005d0d(step=0, col=false, unit=2/5, alt=false, line=0.2, solid=!$preview)
    makepoly(ldraw_lib__3005d0d(), step=step, col=col, unit=unit, alt=alt, line=line, solid=solid);
ldraw_lib__3005d0d(line=0.2);
